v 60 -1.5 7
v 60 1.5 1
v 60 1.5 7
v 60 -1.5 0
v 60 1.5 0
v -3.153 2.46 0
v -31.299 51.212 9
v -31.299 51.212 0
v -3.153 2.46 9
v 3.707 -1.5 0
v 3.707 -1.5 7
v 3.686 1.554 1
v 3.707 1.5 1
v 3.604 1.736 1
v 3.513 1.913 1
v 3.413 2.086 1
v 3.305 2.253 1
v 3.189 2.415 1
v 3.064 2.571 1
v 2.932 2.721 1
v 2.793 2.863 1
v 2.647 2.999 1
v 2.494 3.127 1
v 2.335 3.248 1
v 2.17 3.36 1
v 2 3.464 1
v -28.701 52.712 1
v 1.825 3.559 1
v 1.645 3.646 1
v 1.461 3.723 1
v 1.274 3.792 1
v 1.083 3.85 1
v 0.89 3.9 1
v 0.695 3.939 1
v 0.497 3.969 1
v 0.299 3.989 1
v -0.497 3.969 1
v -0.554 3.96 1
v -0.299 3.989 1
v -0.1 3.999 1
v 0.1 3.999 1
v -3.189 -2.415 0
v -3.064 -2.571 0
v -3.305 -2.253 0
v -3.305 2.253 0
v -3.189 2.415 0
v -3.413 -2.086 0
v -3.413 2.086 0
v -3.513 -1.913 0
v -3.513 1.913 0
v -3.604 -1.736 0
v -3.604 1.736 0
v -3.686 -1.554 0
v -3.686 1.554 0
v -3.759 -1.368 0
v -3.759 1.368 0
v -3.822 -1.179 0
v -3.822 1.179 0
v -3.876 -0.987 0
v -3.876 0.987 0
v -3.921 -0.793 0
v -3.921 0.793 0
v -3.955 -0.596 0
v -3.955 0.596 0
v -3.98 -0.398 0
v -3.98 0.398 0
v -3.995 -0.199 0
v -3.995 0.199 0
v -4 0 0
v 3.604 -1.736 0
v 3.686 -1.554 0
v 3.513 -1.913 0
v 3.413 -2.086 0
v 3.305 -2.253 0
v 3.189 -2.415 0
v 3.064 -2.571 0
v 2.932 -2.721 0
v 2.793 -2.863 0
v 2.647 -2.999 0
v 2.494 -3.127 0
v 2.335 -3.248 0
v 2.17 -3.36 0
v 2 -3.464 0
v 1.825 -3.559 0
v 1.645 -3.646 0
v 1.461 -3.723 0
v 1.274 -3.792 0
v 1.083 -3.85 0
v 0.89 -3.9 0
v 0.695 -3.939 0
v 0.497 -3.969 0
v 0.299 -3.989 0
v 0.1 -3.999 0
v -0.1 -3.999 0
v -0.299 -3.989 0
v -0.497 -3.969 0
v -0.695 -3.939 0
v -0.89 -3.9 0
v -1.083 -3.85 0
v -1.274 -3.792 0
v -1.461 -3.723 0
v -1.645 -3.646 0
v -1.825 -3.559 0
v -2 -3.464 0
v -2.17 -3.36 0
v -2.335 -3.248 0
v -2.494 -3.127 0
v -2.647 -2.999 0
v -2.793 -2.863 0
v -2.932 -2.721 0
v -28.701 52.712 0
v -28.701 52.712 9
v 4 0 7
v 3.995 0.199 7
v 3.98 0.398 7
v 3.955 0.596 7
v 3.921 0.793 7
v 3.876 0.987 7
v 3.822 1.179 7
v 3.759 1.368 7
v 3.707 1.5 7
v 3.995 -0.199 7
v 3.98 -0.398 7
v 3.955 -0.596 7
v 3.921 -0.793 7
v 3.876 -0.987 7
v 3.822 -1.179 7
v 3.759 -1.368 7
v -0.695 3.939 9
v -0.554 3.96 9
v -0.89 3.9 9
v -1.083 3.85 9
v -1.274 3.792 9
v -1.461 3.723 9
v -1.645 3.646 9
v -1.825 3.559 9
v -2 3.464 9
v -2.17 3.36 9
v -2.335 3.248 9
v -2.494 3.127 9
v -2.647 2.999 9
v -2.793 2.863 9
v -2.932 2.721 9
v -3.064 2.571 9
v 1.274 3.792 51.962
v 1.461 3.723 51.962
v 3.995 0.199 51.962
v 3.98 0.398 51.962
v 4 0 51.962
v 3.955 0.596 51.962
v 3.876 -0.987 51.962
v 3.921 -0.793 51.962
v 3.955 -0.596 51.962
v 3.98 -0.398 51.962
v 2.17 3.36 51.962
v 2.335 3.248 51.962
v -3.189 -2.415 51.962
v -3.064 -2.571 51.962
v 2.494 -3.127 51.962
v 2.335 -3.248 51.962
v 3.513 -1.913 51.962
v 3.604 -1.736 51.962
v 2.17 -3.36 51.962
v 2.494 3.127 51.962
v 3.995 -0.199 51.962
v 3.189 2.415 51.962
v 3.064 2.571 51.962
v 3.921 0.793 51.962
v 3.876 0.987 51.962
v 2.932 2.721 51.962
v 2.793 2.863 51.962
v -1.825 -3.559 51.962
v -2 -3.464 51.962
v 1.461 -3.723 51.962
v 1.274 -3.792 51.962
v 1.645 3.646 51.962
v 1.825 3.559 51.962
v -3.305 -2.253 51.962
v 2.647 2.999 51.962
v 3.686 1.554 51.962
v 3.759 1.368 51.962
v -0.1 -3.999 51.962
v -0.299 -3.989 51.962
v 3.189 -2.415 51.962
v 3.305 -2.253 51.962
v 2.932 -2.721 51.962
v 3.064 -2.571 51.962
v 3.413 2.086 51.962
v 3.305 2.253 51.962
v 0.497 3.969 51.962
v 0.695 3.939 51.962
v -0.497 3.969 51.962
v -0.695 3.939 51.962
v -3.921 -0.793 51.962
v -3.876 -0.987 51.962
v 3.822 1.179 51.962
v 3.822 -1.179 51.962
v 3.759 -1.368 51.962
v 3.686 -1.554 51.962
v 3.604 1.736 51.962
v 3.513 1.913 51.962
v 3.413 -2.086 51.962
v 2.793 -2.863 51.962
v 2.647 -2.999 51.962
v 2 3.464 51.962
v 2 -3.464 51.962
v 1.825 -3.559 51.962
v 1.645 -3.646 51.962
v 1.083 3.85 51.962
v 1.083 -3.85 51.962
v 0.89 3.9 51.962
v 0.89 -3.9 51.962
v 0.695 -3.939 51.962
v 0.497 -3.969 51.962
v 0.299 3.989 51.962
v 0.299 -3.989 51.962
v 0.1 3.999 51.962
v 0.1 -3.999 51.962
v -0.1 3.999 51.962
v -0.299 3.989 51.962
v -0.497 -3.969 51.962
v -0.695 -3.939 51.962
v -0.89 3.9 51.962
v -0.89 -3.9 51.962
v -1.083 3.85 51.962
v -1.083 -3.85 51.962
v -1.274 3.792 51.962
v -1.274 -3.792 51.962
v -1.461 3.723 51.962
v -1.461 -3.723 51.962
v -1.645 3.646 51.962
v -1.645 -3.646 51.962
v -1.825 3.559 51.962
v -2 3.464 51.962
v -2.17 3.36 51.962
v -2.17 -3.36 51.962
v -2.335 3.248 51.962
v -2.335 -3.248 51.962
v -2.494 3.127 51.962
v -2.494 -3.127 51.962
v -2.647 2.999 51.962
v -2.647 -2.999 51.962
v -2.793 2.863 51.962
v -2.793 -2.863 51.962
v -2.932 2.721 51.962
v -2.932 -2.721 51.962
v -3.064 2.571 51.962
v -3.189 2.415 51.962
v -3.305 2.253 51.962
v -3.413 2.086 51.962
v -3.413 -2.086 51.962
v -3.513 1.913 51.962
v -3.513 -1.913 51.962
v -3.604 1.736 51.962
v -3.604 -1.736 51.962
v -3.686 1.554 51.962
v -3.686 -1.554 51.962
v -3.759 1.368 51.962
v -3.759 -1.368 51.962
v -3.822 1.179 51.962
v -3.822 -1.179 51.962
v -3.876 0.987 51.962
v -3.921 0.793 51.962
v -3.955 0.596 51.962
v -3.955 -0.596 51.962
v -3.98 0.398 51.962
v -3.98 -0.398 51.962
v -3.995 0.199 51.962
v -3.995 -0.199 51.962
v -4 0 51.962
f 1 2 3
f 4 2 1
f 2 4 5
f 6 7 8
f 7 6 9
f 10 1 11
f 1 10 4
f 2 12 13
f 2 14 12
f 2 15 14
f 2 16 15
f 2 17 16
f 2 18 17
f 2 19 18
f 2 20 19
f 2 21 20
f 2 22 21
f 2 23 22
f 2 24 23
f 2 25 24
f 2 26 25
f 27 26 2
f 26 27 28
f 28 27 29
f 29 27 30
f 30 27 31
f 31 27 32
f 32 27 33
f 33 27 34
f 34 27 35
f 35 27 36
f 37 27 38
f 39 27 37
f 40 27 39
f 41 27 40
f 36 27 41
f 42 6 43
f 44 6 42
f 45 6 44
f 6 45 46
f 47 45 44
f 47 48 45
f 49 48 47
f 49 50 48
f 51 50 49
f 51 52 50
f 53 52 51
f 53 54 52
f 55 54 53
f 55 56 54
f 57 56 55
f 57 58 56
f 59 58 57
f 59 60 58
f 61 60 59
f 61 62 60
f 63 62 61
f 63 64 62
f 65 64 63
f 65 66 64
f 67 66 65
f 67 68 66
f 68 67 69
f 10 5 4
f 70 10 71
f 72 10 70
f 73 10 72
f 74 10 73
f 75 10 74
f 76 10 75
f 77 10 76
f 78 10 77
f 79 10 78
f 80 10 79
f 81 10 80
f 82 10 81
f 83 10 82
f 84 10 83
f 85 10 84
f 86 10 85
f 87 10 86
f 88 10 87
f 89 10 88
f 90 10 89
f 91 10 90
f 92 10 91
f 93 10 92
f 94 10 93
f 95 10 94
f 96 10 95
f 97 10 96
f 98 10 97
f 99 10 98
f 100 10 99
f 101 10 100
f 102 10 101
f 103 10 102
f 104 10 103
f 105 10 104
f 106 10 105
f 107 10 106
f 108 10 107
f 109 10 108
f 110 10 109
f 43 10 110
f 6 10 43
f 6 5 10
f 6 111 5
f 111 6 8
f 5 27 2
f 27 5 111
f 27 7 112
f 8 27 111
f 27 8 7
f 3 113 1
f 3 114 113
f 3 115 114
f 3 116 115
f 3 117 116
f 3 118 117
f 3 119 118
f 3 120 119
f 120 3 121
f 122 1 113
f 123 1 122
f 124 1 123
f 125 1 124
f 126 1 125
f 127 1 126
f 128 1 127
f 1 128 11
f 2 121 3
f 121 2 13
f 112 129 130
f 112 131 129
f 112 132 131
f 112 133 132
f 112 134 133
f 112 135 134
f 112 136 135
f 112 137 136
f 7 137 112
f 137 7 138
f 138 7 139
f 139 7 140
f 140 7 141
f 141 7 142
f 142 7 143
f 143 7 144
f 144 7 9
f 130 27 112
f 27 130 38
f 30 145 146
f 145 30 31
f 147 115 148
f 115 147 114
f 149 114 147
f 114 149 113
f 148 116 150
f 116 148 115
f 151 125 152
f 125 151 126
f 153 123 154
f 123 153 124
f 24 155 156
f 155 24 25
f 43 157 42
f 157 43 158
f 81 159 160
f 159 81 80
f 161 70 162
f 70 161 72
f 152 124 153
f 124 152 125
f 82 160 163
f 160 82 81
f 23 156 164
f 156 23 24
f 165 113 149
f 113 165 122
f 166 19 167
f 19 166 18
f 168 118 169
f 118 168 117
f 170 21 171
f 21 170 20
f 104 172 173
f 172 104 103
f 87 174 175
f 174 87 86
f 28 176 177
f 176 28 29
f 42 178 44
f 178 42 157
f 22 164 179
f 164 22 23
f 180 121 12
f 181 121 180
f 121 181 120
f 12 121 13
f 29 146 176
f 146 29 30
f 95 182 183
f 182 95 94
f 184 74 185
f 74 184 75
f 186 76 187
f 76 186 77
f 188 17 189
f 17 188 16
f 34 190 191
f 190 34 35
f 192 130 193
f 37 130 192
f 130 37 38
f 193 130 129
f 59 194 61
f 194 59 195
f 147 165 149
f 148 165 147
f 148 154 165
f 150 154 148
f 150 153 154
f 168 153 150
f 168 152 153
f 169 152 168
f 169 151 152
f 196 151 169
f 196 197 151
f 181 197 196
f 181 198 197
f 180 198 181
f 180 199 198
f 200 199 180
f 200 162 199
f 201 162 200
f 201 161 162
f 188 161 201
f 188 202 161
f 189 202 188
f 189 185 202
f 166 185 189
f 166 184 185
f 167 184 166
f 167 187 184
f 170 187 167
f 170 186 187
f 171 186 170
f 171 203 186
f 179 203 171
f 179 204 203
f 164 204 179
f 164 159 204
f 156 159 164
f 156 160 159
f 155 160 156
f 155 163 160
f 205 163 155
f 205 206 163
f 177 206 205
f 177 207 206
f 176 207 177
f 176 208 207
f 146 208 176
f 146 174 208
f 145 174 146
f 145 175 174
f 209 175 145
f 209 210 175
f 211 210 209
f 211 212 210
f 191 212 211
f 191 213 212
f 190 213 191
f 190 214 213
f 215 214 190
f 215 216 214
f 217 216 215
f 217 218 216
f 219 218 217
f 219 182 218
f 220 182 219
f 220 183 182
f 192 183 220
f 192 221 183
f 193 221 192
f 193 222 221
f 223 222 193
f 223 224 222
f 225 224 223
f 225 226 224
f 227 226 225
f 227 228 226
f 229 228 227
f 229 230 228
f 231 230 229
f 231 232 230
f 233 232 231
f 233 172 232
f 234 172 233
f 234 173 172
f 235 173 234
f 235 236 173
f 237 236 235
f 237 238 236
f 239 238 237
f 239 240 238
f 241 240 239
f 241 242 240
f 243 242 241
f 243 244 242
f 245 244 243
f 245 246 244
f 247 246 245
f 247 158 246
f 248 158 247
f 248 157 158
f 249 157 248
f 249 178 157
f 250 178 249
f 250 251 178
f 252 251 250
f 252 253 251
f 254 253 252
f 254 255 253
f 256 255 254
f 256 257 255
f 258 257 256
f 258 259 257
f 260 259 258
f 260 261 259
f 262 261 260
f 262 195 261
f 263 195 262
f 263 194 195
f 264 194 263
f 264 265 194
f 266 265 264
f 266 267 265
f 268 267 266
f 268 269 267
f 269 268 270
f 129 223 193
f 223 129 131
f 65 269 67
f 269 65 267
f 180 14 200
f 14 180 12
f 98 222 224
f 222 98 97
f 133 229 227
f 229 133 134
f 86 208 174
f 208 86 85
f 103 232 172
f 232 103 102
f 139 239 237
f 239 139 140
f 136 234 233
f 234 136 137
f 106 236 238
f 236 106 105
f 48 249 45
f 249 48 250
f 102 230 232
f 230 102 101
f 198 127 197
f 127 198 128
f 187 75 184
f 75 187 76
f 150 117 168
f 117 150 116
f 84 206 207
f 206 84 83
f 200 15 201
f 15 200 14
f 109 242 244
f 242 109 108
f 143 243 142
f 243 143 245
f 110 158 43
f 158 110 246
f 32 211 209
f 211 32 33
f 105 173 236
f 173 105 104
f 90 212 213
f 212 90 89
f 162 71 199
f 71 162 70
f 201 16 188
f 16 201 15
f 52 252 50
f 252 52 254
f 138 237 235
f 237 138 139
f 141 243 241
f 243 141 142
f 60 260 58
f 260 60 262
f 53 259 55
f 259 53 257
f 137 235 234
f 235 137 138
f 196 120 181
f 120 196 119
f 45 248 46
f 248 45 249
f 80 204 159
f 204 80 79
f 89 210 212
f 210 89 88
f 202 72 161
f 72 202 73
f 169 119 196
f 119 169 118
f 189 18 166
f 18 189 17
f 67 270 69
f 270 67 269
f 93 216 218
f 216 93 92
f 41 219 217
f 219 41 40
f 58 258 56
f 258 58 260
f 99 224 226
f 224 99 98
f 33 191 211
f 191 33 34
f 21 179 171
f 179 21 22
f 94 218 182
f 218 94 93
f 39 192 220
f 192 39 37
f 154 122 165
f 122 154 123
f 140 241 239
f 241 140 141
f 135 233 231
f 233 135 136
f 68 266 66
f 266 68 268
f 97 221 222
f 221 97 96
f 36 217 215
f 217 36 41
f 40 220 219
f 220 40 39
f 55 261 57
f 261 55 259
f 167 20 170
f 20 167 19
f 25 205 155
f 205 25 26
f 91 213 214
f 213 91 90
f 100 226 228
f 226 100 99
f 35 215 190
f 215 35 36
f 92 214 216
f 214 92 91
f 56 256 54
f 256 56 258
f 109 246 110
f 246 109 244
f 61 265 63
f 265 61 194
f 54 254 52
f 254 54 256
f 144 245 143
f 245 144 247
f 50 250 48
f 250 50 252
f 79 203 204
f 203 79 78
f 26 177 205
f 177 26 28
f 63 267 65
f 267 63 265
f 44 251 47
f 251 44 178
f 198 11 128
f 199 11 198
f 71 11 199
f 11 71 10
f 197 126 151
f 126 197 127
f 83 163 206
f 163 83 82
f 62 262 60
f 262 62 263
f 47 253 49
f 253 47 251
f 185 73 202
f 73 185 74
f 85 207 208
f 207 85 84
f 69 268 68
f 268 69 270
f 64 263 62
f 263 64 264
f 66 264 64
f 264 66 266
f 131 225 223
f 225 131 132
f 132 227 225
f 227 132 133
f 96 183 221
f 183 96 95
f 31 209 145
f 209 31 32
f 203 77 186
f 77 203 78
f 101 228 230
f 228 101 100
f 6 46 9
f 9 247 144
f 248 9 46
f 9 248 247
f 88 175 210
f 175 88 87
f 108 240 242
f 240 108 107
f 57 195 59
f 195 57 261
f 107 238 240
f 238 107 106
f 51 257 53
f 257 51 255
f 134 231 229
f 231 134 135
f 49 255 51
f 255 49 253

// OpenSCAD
// File crossProd.scad
// Creates a triangle connecting two segments and a perpendicular
// cylinder with a height proportional to the area
// for visualizing how cross product varies with angle
// (c) 2019-2022 Rich Cameron, for the book Make:Calculus
// Licensed under a Creative Commons, Attribution,
// CC-BY 4.0 international license, per
// https://creativecommons.org/licenses/by/4.0/
// Attribute to Rich Cameron, at
// repository github.com/whosawhatsis/Calculus

angle = 120;  // angle between vectors, degrees
width = 3;
$fs = .2;
$fa = 2;

hull() {
    translate([0, -width/2, 0]) cube([60, width, 1]);
    rotate([0, 0, angle]) translate([0, -width/2, 0]) cube([60, width, 1]);
 }

translate([0, -width/2, 0]) cube([60, width, 7]);
rotate([0, 0, angle]) translate([0, -width/2, 0]) cube([60, width, 9]);

// height of the cross-product 
 
cylinder(r = 4, h = 60 * sin(angle));
